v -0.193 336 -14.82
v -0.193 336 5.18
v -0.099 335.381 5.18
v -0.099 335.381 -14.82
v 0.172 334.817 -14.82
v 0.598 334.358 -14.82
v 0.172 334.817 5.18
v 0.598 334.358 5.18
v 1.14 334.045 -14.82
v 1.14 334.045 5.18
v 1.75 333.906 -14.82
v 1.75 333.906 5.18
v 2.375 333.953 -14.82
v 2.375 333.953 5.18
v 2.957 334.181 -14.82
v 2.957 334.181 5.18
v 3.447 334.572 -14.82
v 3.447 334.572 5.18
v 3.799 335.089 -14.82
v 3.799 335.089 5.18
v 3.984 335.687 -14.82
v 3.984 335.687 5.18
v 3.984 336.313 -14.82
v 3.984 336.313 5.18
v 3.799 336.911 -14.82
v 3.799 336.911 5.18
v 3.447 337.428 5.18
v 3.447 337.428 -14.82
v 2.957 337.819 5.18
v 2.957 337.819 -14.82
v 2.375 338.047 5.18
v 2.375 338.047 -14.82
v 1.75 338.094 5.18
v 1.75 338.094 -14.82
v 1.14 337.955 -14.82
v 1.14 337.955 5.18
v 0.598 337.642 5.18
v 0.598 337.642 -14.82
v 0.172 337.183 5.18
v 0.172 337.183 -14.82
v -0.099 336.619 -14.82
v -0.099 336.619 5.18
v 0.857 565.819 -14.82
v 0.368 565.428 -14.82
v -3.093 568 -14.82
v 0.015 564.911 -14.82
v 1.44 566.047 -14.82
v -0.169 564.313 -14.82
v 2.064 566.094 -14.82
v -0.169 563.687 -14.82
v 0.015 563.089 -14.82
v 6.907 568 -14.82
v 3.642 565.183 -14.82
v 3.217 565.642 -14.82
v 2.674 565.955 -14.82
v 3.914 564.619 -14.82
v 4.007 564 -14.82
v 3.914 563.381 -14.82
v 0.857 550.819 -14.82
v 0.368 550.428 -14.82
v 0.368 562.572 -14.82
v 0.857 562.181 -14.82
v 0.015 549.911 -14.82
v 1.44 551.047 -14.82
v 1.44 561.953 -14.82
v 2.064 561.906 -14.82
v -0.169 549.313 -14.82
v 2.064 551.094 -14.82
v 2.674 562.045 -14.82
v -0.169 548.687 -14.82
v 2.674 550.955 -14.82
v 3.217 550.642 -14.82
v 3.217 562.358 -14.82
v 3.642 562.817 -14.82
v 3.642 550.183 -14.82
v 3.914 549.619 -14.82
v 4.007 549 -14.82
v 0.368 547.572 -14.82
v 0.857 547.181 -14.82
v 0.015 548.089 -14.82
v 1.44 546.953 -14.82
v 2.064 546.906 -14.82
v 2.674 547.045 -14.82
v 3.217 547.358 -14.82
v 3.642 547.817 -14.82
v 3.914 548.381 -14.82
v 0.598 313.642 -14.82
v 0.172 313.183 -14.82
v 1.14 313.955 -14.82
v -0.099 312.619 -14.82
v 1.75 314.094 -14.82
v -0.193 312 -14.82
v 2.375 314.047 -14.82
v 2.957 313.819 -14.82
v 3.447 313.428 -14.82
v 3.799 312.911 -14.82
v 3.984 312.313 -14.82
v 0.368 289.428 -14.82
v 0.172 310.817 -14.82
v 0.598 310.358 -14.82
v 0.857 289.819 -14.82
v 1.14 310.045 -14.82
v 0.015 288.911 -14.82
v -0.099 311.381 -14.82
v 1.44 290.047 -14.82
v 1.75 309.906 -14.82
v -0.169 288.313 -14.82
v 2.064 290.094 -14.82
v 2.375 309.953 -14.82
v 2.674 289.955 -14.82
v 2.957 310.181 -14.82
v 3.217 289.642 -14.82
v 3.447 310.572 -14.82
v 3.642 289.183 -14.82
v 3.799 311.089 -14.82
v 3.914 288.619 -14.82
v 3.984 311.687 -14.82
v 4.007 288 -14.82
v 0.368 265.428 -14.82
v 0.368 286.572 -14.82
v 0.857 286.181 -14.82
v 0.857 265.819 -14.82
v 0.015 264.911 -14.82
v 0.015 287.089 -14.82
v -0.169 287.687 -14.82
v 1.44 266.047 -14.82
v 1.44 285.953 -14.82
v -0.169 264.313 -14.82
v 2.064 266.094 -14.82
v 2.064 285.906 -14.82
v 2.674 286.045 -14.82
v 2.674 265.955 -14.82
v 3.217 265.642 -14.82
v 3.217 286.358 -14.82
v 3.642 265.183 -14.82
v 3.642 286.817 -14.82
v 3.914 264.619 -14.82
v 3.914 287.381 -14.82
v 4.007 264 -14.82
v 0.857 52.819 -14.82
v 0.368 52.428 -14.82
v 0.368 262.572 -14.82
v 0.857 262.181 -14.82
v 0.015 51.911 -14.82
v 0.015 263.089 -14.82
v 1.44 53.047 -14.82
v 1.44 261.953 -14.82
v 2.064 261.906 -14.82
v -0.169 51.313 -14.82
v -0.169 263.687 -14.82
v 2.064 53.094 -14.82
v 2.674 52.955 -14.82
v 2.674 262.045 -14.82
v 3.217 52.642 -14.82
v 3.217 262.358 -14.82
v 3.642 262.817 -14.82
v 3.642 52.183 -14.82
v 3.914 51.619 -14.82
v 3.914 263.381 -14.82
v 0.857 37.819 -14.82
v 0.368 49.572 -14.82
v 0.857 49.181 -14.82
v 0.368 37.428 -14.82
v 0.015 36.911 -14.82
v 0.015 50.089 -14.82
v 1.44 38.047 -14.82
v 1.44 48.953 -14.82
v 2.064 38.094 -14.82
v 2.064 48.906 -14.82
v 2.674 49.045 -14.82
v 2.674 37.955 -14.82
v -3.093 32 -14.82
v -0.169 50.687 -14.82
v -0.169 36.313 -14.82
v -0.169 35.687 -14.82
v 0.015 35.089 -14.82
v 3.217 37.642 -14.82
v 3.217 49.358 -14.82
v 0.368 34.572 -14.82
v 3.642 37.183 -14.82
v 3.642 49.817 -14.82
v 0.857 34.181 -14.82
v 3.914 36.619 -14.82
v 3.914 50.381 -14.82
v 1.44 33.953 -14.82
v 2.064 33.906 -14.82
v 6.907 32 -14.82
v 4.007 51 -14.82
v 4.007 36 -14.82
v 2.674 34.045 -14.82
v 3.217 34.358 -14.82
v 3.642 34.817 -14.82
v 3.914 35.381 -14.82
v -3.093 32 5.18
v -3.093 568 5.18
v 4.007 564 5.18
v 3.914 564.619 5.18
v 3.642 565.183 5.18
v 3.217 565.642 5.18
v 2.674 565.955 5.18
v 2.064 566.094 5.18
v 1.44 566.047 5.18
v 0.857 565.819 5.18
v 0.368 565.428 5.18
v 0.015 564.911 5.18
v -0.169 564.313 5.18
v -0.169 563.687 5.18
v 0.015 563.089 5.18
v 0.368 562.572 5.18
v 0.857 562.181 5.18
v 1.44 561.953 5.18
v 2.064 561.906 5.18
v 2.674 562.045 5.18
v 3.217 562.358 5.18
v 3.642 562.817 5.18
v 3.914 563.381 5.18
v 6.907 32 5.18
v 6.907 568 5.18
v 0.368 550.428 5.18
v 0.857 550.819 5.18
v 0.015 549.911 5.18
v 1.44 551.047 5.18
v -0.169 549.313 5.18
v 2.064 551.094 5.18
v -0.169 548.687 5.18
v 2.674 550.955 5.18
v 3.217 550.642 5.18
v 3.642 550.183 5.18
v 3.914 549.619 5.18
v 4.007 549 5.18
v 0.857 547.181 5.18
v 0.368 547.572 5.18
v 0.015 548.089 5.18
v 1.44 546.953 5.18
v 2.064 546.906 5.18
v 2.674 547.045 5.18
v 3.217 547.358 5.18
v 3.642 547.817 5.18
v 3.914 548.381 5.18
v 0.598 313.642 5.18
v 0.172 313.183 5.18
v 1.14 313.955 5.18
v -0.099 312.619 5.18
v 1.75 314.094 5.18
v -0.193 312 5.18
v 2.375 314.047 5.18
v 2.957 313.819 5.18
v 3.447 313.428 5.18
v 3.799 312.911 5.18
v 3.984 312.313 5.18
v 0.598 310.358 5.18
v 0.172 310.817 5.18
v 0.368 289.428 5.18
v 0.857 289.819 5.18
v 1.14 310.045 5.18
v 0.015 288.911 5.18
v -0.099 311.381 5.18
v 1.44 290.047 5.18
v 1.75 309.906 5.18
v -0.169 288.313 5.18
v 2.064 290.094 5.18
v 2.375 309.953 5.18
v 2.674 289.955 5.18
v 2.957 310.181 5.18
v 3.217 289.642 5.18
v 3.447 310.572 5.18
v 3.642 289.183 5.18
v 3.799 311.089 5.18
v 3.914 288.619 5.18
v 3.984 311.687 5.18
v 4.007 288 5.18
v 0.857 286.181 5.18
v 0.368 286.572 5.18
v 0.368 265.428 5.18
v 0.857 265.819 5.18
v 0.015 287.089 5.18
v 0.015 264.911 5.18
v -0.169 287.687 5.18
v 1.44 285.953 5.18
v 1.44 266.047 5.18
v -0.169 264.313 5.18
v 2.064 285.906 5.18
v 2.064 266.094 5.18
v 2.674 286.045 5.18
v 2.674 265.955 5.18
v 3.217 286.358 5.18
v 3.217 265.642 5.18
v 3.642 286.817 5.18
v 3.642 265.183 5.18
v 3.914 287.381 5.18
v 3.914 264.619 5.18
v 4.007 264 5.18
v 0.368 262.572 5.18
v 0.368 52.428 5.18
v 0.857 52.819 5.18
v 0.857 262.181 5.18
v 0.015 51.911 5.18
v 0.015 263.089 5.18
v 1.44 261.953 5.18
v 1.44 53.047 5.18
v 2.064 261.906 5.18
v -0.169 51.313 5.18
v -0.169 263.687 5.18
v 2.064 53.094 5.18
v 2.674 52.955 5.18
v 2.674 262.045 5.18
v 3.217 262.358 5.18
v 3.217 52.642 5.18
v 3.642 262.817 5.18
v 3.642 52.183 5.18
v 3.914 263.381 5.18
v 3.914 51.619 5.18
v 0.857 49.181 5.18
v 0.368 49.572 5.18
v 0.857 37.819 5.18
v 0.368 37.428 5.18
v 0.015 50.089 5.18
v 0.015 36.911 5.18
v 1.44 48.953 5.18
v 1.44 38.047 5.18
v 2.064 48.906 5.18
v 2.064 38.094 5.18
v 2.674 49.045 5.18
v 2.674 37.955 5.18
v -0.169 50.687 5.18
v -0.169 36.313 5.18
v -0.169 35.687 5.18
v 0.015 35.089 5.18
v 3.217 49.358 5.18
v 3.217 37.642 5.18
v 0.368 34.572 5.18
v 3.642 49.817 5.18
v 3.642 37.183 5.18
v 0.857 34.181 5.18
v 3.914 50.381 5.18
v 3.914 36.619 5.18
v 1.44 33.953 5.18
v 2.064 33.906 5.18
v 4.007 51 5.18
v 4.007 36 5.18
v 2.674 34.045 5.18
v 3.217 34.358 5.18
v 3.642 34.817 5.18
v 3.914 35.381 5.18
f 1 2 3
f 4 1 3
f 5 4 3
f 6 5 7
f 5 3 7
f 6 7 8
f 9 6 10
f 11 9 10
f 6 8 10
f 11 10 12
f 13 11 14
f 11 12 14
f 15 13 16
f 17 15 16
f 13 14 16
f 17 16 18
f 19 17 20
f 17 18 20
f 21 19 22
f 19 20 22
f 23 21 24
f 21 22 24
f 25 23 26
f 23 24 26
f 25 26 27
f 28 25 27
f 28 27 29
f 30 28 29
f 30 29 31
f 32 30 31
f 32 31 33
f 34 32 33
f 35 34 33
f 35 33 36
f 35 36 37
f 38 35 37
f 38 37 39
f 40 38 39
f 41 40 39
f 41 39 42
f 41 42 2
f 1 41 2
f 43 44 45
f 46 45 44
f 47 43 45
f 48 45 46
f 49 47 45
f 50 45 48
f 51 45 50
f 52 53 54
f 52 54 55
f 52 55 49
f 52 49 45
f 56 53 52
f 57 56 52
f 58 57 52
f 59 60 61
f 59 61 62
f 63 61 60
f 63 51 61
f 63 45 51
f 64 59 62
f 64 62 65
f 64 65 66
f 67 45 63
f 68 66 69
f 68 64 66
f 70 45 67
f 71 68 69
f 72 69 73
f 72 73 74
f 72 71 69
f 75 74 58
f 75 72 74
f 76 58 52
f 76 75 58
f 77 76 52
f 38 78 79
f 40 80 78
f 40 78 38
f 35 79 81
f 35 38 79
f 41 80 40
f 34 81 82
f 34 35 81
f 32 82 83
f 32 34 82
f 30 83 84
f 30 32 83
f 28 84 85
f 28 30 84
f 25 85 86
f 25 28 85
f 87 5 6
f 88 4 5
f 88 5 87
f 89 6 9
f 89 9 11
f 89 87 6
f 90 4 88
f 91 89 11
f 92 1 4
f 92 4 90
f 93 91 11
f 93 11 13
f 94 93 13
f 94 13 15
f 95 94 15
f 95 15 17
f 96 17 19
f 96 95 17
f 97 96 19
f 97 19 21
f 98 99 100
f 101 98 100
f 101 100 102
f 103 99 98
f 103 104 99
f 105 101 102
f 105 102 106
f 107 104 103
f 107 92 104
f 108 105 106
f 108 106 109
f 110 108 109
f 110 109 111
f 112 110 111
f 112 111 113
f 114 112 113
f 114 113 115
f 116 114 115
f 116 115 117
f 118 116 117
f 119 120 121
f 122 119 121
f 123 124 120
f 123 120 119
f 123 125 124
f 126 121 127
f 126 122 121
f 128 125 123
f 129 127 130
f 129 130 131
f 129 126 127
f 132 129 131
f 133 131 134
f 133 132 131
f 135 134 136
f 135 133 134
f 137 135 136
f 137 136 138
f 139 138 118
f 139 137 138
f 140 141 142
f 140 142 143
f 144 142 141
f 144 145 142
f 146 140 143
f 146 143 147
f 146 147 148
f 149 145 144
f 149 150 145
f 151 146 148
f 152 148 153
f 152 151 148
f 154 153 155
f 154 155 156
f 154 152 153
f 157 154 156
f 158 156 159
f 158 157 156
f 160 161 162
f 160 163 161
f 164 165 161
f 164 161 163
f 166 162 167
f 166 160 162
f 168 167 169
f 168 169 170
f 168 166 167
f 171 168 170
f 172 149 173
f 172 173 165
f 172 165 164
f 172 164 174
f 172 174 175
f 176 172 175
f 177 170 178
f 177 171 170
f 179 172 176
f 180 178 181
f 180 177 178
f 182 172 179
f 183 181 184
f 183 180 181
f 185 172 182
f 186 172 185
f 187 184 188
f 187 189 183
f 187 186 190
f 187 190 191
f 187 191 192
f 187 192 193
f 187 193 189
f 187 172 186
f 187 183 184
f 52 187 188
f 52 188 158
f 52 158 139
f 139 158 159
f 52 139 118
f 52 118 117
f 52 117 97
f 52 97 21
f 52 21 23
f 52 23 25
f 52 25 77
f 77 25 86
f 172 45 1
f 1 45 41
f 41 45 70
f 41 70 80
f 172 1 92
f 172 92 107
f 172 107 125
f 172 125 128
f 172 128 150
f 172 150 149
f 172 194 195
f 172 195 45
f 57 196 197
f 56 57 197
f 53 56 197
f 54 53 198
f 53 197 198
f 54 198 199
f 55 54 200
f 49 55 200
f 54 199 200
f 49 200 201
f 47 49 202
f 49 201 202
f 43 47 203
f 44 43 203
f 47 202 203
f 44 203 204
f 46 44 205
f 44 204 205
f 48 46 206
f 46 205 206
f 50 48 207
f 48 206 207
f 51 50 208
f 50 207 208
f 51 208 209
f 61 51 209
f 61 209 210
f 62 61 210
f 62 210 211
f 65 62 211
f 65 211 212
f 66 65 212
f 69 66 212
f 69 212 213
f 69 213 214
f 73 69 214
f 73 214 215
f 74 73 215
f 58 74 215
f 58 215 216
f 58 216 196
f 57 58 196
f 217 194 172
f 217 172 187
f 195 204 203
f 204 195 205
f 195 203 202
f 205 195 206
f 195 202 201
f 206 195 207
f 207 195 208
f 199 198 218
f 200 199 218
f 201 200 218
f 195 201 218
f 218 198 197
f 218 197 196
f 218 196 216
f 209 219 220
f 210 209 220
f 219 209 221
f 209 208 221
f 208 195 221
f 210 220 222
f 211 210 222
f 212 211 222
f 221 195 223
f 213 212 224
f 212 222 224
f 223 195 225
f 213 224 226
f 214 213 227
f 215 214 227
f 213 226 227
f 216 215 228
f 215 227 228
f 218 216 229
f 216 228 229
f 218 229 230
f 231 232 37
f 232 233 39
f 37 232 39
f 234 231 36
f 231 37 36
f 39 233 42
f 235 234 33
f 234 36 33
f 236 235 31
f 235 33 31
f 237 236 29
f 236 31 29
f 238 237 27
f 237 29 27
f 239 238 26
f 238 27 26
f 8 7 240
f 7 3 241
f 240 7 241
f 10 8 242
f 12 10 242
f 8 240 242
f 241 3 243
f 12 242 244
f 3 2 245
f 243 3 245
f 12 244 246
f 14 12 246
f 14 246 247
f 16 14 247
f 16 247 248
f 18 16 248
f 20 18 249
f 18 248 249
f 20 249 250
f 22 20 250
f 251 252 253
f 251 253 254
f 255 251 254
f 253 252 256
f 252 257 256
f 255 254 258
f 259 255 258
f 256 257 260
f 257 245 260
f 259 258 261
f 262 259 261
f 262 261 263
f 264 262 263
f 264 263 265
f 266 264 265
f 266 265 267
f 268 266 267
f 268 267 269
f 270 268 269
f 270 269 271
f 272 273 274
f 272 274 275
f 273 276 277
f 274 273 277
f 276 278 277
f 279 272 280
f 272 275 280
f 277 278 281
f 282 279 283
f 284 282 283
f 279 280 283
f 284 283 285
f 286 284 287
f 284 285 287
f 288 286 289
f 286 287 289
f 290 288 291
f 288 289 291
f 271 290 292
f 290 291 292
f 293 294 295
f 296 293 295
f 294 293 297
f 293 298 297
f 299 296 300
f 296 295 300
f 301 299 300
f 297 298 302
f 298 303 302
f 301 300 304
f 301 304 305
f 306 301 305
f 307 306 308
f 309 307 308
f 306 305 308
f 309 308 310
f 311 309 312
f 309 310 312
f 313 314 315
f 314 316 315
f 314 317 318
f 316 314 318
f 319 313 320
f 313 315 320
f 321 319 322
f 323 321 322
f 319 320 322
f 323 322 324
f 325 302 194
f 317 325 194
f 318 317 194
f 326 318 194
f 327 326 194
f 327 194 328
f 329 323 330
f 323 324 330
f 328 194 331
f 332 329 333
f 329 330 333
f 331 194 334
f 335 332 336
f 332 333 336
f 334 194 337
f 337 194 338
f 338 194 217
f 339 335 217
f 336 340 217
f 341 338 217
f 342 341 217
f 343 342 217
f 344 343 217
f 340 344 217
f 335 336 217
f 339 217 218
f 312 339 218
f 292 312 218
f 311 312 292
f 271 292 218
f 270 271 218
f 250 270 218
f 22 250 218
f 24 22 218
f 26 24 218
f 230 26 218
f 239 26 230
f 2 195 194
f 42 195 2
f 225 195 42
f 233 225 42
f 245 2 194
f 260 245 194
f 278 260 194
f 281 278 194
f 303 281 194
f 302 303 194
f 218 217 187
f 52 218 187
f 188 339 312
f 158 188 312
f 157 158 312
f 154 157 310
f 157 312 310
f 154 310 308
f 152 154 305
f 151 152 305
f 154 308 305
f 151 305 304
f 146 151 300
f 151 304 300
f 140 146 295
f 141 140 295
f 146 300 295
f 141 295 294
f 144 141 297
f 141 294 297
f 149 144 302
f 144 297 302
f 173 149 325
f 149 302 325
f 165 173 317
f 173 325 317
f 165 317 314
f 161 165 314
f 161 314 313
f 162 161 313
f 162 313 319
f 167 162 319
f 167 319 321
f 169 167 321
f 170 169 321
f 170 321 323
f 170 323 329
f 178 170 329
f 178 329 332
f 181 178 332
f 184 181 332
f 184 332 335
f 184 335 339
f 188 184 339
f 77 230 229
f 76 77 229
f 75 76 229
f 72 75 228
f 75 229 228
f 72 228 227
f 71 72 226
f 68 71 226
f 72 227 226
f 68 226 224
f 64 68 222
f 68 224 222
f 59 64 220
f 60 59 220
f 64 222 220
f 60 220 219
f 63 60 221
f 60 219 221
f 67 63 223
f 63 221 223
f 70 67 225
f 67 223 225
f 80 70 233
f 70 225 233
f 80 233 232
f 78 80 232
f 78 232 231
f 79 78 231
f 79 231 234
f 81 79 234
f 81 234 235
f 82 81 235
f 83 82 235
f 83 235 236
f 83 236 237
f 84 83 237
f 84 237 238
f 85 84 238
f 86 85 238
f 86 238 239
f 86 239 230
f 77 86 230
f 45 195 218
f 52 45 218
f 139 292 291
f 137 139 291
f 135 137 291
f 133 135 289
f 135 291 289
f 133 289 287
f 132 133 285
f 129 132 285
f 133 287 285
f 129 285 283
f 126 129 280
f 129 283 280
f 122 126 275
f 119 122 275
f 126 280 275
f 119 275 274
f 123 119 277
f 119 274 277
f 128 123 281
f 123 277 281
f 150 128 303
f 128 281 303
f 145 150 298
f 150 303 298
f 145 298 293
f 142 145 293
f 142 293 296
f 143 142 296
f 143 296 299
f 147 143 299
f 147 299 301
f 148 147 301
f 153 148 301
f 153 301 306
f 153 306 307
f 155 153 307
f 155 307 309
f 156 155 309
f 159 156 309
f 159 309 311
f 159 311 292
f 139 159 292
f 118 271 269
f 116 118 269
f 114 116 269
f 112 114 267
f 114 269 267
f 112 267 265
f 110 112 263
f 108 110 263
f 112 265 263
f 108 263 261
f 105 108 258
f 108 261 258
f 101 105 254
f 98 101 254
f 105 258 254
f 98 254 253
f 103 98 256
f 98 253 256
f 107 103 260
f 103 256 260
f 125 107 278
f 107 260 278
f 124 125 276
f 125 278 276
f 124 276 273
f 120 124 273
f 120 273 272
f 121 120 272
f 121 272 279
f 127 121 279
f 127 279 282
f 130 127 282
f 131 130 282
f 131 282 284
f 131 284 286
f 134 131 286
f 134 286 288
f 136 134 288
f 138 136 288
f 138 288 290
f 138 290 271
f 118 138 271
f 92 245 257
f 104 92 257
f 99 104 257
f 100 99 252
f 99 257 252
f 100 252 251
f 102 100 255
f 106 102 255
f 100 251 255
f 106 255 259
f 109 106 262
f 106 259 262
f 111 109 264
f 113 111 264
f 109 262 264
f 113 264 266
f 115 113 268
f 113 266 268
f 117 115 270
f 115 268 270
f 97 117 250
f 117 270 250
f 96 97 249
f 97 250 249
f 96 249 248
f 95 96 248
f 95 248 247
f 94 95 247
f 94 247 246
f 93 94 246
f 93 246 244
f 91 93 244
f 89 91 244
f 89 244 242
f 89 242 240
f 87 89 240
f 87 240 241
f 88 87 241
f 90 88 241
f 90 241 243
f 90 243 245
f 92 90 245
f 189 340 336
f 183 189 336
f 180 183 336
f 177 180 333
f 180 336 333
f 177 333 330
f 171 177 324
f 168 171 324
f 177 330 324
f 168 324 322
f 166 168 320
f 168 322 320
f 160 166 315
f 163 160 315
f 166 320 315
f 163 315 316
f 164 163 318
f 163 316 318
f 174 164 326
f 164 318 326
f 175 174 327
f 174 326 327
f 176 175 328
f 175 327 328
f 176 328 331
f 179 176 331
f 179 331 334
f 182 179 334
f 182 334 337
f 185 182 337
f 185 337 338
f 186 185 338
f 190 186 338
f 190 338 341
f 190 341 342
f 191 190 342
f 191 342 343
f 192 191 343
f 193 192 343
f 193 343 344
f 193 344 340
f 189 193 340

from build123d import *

# Parameters (mm, degrees)
SKETCH_1_W          = 10
SKETCH_1_H          = 20
EXTRUDE_1_DEPTH     = 600
SKETCH_6_W          = 20
SKETCH_6_H          = 10
CUT_EXTRUDE_4_DEPTH = 50
SKETCH_7_W          = 10
SKETCH_7_H          = 10
CUT_EXTRUDE_5_DEPTH = 82
SKETCH_2_R          = 2.1
CUT_EXTRUDE_6_DEPTH = 591.379293031
SKETCH_8_R          = 2.1
CUT_EXTRUDE_7_DEPTH = 54
SKETCH_9_W          = 10
SKETCH_9_H          = 22
CUT_EXTRUDE_8_DEPTH = 591.379293031


with BuildPart() as part:
    # 草图1 → 凸台-拉伸1 (new body)
    with BuildSketch(Plane(origin=(0, 0, 0), x_dir=(1, 0, 0), z_dir=(0, 1, 0))):
        with Locations((1.907216495, 4.819587629)):
            Rectangle(SKETCH_1_W, SKETCH_1_H)
    extrude(amount=EXTRUDE_1_DEPTH)

    # 草图6 → 切除-拉伸4 (cut)
    with BuildSketch(Plane(origin=(0, 0, -14.819587629), x_dir=(-1, 0, 0), z_dir=(0, 0, -1))):
        with Locations((3.092783505, 595)):
            Rectangle(SKETCH_6_W, SKETCH_6_H)
    extrude(amount=-CUT_EXTRUDE_4_DEPTH, mode=Mode.SUBTRACT)

    # 草图7 → 切除-拉伸5 (cut)
    with BuildSketch(Plane(origin=(0, 0, -14.819587629), x_dir=(-1, 0, 0), z_dir=(0, 0, -1))):
        with Locations((-1.907216495, 5)):
            Rectangle(SKETCH_7_W, SKETCH_7_H)
    extrude(amount=-CUT_EXTRUDE_5_DEPTH, mode=Mode.SUBTRACT)

    # 草图2 → 切除-拉伸6 (cut, through all)
    with BuildSketch(Plane.XY.offset(5.180412371)):
        with Locations((1.907216495, 264)):
            Circle(SKETCH_2_R)
        with Locations((1.907216495, 288)):
            Circle(SKETCH_2_R)
        with Locations(Location((1.907216495, 312, 0), (0, 0, 180))):
            Circle(SKETCH_2_R)
        with Locations(Location((1.907216495, 336, 0), (0, 0, 180))):
            Circle(SKETCH_2_R)
    extrude(amount=-CUT_EXTRUDE_6_DEPTH, mode=Mode.SUBTRACT)

    # 草图8 → 切除-拉伸7 (cut)
    with BuildSketch(Plane.XY.offset(5.180412371)):
        with Locations((1.907216495, 564)):
            Circle(SKETCH_8_R)
        with Locations((1.907216495, 549)):
            Circle(SKETCH_8_R)
        with Locations((1.907216495, 36)):
            Circle(SKETCH_8_R)
        with Locations((1.907216495, 51)):
            Circle(SKETCH_8_R)
        with Locations((1.907216495, 583)):
            Circle(SKETCH_8_R)
        with Locations((1.907216495, 17)):
            Circle(SKETCH_8_R)
    extrude(amount=-CUT_EXTRUDE_7_DEPTH, mode=Mode.SUBTRACT)

    # 草图9 → 切除-拉伸8 (cut, through all)
    with BuildSketch(Plane.XY.offset(5.180412371)):
        with Locations((1.907216495, 21)):
            Rectangle(SKETCH_9_W, SKETCH_9_H)
        with Locations((1.907216495, 579)):
            Rectangle(SKETCH_9_W, SKETCH_9_H)
    extrude(amount=-CUT_EXTRUDE_8_DEPTH, mode=Mode.SUBTRACT)


solid = part.part
